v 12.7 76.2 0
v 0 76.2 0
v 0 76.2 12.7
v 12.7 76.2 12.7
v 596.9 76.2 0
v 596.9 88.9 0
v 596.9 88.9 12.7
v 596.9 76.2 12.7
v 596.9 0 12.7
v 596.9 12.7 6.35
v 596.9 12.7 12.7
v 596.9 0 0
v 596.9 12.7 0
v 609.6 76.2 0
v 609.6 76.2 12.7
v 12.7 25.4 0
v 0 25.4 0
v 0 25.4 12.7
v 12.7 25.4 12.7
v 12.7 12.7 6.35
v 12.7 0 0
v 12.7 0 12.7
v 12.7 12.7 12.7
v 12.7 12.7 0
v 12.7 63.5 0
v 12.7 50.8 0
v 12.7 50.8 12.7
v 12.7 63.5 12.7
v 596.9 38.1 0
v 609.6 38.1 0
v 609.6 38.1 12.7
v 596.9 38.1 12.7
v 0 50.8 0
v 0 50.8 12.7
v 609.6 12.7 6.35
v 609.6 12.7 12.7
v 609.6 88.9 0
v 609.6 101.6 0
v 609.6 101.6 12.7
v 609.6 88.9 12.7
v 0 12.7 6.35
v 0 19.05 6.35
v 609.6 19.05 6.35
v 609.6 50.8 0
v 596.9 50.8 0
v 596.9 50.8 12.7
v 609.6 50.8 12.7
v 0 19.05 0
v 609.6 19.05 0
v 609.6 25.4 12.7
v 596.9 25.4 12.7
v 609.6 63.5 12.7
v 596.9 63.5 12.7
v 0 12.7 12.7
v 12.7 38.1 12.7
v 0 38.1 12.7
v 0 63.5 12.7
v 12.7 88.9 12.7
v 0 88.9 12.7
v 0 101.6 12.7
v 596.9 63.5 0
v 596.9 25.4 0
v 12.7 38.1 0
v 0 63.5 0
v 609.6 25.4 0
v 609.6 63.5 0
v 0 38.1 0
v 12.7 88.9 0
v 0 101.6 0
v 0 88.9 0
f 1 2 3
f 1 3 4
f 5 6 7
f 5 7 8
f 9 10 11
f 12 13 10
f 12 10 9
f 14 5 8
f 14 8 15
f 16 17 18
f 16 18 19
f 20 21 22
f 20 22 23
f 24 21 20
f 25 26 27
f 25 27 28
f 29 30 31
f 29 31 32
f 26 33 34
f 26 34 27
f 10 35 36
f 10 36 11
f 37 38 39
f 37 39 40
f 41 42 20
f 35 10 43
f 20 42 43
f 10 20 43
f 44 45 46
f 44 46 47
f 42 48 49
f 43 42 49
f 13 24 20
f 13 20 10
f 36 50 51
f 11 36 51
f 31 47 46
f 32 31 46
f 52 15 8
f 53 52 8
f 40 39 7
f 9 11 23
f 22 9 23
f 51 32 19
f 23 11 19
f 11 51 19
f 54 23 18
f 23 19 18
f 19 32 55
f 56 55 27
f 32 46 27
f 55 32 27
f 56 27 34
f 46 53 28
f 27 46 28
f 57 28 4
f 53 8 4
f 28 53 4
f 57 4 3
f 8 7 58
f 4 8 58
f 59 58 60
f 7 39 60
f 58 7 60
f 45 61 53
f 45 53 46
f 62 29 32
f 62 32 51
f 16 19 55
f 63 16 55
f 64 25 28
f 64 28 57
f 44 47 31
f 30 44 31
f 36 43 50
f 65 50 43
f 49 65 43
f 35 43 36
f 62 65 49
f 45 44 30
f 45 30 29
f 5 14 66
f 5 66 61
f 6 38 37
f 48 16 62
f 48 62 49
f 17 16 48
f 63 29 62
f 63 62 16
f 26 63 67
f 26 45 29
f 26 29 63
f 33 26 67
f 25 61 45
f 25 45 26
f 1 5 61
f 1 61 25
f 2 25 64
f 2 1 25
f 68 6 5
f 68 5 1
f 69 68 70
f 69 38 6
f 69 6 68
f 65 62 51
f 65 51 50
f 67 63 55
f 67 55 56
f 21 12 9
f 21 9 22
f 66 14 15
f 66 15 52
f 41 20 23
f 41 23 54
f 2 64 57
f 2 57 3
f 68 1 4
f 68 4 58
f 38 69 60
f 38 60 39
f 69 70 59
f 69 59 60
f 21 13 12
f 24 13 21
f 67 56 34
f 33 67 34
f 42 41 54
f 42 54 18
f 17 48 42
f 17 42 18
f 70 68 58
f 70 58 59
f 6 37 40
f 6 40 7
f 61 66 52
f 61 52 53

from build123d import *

# Parameters (mm, degrees)
BOSS_EXTRUDE1_DEPTH = 12.7
SKETCH2_W           = 637.164894533
SKETCH2_H           = 6.35
CUT_EXTRUDE1_DEPTH  = 6.35


with BuildPart() as part:
    # Sketch1 → Boss-Extrude1 (new body)
    with BuildSketch(Plane.XY):
        Polygon((0, 25.4), (0, 12.7), (12.7, 12.7), (12.7, 0), (596.9, 0), (596.9, 12.7), (609.6, 12.7), (609.6, 25.4), (596.9, 25.4), (596.9, 38.1), (609.6, 38.1), (609.6, 50.8), (596.9, 50.8), (596.9, 63.5), (609.6, 63.5), (609.6, 76.2), (596.9, 76.2), (596.9, 88.9), (609.6, 88.9), (609.6, 101.6), (0, 101.6), (0, 88.9), (12.7, 88.9), (12.7, 76.2), (0, 76.2), (0, 63.5), (12.7, 63.5), (12.7, 50.8), (0, 50.8), (0, 38.1), (12.7, 38.1), (12.7, 25.4), align=None)
    extrude(amount=BOSS_EXTRUDE1_DEPTH)

    # Sketch2 → Cut-Extrude1 (cut)
    with BuildSketch(Plane.XY):
        with Locations((307.699845939, 15.875)):
            Rectangle(SKETCH2_W, SKETCH2_H)
    extrude(amount=CUT_EXTRUDE1_DEPTH, mode=Mode.SUBTRACT)


solid = part.part
